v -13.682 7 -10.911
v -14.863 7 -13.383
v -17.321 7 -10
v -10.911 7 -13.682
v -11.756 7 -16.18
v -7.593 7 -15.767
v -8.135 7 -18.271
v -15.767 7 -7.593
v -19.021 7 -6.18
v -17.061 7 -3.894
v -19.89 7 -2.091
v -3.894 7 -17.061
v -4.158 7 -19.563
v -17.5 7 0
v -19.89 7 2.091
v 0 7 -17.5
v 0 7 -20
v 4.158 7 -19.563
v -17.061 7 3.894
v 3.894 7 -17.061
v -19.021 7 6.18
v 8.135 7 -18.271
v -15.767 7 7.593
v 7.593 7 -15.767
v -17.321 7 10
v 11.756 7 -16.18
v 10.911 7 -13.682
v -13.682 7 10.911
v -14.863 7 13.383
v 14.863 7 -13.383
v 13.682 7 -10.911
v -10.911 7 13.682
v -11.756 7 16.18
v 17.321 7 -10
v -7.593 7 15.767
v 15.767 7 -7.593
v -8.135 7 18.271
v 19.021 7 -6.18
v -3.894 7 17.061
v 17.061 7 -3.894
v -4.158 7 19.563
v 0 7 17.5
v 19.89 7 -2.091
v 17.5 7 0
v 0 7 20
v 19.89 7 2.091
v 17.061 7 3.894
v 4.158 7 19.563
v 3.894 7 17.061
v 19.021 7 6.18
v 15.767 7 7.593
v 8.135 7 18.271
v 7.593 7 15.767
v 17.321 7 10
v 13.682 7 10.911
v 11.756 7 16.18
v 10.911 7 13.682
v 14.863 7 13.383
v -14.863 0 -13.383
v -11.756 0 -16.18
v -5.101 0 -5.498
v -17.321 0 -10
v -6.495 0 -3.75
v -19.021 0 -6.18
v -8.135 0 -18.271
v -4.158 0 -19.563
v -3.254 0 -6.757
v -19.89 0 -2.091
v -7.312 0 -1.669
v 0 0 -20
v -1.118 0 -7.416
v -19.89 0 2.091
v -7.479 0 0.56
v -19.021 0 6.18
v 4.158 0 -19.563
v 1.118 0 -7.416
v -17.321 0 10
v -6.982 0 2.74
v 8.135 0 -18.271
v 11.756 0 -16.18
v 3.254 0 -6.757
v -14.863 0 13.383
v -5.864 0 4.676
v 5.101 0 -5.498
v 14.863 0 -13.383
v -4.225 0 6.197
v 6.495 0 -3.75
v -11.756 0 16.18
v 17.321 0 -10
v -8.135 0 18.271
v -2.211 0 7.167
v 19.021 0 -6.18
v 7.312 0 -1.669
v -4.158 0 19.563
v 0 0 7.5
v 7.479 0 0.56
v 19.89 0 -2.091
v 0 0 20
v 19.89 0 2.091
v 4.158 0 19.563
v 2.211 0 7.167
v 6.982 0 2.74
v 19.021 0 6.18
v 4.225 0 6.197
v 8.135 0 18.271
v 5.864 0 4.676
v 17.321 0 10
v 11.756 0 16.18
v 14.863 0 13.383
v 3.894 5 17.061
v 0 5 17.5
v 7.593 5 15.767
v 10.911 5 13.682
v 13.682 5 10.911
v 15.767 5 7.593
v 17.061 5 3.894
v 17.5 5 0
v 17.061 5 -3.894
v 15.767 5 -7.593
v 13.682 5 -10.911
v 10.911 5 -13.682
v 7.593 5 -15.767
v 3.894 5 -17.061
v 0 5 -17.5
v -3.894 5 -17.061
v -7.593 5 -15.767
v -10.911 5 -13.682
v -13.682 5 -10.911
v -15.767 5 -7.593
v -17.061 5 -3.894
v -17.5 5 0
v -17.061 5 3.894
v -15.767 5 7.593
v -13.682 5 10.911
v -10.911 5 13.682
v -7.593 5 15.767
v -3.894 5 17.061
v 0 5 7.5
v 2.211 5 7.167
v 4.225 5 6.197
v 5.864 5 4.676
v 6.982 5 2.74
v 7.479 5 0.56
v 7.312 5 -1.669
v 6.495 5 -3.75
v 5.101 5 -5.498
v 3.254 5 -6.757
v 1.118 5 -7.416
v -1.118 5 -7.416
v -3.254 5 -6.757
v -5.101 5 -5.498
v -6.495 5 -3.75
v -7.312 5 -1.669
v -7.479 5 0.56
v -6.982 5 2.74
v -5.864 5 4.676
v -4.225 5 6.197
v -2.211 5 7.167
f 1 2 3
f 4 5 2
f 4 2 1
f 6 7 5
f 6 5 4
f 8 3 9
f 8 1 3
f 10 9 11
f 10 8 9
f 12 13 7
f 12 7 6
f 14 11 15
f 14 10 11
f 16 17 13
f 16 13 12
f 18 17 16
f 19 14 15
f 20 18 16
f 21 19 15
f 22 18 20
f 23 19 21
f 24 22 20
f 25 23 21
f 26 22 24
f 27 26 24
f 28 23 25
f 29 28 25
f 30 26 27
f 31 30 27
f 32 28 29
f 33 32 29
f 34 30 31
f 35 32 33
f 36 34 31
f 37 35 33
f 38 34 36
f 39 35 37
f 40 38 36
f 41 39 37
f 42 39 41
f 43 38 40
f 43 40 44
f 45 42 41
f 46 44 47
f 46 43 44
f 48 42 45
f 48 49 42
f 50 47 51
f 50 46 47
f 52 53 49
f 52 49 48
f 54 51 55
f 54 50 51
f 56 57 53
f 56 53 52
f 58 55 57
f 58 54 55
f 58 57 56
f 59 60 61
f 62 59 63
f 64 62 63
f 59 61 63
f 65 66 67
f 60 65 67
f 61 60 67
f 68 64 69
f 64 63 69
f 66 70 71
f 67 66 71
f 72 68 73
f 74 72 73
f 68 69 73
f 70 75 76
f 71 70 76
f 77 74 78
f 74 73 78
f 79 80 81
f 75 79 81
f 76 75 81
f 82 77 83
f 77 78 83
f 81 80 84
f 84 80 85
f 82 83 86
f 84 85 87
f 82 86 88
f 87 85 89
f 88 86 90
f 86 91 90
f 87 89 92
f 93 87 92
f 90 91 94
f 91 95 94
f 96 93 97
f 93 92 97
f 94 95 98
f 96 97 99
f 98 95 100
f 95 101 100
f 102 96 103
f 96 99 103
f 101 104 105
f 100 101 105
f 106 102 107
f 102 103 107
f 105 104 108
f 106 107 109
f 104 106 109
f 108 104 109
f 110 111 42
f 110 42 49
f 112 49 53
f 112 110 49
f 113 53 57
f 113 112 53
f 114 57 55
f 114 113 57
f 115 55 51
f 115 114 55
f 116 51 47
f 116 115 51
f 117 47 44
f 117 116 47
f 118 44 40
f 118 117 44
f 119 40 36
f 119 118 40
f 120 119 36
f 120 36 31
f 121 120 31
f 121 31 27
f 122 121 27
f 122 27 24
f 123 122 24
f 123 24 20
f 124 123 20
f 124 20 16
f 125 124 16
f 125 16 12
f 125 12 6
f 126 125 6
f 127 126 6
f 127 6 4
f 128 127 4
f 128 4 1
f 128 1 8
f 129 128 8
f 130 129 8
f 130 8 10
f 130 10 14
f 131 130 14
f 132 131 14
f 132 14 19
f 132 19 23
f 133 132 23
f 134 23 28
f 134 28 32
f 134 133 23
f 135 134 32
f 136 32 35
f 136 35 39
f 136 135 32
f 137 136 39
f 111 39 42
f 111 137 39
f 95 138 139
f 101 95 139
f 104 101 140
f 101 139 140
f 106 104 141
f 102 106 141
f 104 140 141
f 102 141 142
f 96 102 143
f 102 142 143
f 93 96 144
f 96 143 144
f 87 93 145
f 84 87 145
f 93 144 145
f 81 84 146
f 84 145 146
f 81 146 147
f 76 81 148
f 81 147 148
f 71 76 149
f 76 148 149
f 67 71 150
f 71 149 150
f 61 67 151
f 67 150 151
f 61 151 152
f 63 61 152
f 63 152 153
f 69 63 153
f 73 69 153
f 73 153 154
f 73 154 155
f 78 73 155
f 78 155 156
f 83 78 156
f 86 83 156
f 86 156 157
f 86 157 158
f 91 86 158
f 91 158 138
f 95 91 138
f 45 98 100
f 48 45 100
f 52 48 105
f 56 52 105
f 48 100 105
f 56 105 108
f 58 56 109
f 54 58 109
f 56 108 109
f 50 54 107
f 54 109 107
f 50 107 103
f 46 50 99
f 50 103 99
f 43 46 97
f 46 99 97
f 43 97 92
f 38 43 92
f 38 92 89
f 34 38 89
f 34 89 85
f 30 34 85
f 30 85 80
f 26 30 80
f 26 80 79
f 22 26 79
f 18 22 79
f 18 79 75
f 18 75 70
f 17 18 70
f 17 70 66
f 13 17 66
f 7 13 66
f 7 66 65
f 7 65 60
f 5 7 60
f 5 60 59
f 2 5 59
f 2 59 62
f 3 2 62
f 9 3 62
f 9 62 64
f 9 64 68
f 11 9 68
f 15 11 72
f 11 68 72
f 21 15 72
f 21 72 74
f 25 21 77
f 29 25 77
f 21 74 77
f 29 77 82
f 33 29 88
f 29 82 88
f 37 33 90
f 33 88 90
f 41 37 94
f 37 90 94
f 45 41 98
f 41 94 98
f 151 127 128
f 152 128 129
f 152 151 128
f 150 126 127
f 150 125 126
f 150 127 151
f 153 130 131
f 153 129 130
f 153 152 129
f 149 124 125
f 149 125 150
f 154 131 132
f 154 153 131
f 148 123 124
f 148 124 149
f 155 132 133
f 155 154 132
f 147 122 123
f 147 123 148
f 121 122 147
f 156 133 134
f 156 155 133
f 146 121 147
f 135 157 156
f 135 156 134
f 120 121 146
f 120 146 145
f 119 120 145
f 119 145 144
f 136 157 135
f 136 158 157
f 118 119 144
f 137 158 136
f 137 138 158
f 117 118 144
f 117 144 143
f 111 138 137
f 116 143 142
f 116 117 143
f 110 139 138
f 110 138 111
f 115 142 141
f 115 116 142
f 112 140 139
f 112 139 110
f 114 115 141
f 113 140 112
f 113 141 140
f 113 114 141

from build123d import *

# Parameters (mm, degrees)
SKETCH1_R           = 20
SKETCH1_R_2         = 17.5
BOSS_EXTRUDE1_DEPTH = 5
SKETCH1_3_R         = 20
SKETCH1_3_R_2       = 17.5
BOSS_EXTRUDE3_DEPTH = 7
SKETCH3_R           = 7.5
CUT_EXTRUDE2_DEPTH  = 7


with BuildPart() as part:
    # Sketch1 → Boss-Extrude1 (new body)
    # profile 1 of 2: a face of its own
    with BuildSketch(Plane(origin=(0, 0, 0), x_dir=(1, 0, 0), z_dir=(0, 1, 0))):
        Circle(SKETCH1_R)
        Circle(SKETCH1_R_2, mode=Mode.SUBTRACT)
    # profile 2 of 2: a face of its own
    with BuildSketch(Plane(origin=(0, 0, 0), x_dir=(1, 0, 0), z_dir=(0, 1, 0))):
        Circle(SKETCH1_R_2)
    extrude(amount=BOSS_EXTRUDE1_DEPTH)

    # Sketch1<3> → Boss-Extrude3 (add)
    with BuildSketch(Plane(origin=(0, 0, 0), x_dir=(1, 0, 0), z_dir=(0, 1, 0))):
        Circle(SKETCH1_3_R)
        Circle(SKETCH1_3_R_2, mode=Mode.SUBTRACT)
    extrude(amount=BOSS_EXTRUDE3_DEPTH)

    # Sketch3 → Cut-Extrude2 (cut)
    with BuildSketch(Plane(origin=(0, 5, 0), x_dir=(1, 0, 0), z_dir=(0, 1, 0))):
        Circle(SKETCH3_R)
    extrude(amount=-CUT_EXTRUDE2_DEPTH, mode=Mode.SUBTRACT)


solid = part.part
